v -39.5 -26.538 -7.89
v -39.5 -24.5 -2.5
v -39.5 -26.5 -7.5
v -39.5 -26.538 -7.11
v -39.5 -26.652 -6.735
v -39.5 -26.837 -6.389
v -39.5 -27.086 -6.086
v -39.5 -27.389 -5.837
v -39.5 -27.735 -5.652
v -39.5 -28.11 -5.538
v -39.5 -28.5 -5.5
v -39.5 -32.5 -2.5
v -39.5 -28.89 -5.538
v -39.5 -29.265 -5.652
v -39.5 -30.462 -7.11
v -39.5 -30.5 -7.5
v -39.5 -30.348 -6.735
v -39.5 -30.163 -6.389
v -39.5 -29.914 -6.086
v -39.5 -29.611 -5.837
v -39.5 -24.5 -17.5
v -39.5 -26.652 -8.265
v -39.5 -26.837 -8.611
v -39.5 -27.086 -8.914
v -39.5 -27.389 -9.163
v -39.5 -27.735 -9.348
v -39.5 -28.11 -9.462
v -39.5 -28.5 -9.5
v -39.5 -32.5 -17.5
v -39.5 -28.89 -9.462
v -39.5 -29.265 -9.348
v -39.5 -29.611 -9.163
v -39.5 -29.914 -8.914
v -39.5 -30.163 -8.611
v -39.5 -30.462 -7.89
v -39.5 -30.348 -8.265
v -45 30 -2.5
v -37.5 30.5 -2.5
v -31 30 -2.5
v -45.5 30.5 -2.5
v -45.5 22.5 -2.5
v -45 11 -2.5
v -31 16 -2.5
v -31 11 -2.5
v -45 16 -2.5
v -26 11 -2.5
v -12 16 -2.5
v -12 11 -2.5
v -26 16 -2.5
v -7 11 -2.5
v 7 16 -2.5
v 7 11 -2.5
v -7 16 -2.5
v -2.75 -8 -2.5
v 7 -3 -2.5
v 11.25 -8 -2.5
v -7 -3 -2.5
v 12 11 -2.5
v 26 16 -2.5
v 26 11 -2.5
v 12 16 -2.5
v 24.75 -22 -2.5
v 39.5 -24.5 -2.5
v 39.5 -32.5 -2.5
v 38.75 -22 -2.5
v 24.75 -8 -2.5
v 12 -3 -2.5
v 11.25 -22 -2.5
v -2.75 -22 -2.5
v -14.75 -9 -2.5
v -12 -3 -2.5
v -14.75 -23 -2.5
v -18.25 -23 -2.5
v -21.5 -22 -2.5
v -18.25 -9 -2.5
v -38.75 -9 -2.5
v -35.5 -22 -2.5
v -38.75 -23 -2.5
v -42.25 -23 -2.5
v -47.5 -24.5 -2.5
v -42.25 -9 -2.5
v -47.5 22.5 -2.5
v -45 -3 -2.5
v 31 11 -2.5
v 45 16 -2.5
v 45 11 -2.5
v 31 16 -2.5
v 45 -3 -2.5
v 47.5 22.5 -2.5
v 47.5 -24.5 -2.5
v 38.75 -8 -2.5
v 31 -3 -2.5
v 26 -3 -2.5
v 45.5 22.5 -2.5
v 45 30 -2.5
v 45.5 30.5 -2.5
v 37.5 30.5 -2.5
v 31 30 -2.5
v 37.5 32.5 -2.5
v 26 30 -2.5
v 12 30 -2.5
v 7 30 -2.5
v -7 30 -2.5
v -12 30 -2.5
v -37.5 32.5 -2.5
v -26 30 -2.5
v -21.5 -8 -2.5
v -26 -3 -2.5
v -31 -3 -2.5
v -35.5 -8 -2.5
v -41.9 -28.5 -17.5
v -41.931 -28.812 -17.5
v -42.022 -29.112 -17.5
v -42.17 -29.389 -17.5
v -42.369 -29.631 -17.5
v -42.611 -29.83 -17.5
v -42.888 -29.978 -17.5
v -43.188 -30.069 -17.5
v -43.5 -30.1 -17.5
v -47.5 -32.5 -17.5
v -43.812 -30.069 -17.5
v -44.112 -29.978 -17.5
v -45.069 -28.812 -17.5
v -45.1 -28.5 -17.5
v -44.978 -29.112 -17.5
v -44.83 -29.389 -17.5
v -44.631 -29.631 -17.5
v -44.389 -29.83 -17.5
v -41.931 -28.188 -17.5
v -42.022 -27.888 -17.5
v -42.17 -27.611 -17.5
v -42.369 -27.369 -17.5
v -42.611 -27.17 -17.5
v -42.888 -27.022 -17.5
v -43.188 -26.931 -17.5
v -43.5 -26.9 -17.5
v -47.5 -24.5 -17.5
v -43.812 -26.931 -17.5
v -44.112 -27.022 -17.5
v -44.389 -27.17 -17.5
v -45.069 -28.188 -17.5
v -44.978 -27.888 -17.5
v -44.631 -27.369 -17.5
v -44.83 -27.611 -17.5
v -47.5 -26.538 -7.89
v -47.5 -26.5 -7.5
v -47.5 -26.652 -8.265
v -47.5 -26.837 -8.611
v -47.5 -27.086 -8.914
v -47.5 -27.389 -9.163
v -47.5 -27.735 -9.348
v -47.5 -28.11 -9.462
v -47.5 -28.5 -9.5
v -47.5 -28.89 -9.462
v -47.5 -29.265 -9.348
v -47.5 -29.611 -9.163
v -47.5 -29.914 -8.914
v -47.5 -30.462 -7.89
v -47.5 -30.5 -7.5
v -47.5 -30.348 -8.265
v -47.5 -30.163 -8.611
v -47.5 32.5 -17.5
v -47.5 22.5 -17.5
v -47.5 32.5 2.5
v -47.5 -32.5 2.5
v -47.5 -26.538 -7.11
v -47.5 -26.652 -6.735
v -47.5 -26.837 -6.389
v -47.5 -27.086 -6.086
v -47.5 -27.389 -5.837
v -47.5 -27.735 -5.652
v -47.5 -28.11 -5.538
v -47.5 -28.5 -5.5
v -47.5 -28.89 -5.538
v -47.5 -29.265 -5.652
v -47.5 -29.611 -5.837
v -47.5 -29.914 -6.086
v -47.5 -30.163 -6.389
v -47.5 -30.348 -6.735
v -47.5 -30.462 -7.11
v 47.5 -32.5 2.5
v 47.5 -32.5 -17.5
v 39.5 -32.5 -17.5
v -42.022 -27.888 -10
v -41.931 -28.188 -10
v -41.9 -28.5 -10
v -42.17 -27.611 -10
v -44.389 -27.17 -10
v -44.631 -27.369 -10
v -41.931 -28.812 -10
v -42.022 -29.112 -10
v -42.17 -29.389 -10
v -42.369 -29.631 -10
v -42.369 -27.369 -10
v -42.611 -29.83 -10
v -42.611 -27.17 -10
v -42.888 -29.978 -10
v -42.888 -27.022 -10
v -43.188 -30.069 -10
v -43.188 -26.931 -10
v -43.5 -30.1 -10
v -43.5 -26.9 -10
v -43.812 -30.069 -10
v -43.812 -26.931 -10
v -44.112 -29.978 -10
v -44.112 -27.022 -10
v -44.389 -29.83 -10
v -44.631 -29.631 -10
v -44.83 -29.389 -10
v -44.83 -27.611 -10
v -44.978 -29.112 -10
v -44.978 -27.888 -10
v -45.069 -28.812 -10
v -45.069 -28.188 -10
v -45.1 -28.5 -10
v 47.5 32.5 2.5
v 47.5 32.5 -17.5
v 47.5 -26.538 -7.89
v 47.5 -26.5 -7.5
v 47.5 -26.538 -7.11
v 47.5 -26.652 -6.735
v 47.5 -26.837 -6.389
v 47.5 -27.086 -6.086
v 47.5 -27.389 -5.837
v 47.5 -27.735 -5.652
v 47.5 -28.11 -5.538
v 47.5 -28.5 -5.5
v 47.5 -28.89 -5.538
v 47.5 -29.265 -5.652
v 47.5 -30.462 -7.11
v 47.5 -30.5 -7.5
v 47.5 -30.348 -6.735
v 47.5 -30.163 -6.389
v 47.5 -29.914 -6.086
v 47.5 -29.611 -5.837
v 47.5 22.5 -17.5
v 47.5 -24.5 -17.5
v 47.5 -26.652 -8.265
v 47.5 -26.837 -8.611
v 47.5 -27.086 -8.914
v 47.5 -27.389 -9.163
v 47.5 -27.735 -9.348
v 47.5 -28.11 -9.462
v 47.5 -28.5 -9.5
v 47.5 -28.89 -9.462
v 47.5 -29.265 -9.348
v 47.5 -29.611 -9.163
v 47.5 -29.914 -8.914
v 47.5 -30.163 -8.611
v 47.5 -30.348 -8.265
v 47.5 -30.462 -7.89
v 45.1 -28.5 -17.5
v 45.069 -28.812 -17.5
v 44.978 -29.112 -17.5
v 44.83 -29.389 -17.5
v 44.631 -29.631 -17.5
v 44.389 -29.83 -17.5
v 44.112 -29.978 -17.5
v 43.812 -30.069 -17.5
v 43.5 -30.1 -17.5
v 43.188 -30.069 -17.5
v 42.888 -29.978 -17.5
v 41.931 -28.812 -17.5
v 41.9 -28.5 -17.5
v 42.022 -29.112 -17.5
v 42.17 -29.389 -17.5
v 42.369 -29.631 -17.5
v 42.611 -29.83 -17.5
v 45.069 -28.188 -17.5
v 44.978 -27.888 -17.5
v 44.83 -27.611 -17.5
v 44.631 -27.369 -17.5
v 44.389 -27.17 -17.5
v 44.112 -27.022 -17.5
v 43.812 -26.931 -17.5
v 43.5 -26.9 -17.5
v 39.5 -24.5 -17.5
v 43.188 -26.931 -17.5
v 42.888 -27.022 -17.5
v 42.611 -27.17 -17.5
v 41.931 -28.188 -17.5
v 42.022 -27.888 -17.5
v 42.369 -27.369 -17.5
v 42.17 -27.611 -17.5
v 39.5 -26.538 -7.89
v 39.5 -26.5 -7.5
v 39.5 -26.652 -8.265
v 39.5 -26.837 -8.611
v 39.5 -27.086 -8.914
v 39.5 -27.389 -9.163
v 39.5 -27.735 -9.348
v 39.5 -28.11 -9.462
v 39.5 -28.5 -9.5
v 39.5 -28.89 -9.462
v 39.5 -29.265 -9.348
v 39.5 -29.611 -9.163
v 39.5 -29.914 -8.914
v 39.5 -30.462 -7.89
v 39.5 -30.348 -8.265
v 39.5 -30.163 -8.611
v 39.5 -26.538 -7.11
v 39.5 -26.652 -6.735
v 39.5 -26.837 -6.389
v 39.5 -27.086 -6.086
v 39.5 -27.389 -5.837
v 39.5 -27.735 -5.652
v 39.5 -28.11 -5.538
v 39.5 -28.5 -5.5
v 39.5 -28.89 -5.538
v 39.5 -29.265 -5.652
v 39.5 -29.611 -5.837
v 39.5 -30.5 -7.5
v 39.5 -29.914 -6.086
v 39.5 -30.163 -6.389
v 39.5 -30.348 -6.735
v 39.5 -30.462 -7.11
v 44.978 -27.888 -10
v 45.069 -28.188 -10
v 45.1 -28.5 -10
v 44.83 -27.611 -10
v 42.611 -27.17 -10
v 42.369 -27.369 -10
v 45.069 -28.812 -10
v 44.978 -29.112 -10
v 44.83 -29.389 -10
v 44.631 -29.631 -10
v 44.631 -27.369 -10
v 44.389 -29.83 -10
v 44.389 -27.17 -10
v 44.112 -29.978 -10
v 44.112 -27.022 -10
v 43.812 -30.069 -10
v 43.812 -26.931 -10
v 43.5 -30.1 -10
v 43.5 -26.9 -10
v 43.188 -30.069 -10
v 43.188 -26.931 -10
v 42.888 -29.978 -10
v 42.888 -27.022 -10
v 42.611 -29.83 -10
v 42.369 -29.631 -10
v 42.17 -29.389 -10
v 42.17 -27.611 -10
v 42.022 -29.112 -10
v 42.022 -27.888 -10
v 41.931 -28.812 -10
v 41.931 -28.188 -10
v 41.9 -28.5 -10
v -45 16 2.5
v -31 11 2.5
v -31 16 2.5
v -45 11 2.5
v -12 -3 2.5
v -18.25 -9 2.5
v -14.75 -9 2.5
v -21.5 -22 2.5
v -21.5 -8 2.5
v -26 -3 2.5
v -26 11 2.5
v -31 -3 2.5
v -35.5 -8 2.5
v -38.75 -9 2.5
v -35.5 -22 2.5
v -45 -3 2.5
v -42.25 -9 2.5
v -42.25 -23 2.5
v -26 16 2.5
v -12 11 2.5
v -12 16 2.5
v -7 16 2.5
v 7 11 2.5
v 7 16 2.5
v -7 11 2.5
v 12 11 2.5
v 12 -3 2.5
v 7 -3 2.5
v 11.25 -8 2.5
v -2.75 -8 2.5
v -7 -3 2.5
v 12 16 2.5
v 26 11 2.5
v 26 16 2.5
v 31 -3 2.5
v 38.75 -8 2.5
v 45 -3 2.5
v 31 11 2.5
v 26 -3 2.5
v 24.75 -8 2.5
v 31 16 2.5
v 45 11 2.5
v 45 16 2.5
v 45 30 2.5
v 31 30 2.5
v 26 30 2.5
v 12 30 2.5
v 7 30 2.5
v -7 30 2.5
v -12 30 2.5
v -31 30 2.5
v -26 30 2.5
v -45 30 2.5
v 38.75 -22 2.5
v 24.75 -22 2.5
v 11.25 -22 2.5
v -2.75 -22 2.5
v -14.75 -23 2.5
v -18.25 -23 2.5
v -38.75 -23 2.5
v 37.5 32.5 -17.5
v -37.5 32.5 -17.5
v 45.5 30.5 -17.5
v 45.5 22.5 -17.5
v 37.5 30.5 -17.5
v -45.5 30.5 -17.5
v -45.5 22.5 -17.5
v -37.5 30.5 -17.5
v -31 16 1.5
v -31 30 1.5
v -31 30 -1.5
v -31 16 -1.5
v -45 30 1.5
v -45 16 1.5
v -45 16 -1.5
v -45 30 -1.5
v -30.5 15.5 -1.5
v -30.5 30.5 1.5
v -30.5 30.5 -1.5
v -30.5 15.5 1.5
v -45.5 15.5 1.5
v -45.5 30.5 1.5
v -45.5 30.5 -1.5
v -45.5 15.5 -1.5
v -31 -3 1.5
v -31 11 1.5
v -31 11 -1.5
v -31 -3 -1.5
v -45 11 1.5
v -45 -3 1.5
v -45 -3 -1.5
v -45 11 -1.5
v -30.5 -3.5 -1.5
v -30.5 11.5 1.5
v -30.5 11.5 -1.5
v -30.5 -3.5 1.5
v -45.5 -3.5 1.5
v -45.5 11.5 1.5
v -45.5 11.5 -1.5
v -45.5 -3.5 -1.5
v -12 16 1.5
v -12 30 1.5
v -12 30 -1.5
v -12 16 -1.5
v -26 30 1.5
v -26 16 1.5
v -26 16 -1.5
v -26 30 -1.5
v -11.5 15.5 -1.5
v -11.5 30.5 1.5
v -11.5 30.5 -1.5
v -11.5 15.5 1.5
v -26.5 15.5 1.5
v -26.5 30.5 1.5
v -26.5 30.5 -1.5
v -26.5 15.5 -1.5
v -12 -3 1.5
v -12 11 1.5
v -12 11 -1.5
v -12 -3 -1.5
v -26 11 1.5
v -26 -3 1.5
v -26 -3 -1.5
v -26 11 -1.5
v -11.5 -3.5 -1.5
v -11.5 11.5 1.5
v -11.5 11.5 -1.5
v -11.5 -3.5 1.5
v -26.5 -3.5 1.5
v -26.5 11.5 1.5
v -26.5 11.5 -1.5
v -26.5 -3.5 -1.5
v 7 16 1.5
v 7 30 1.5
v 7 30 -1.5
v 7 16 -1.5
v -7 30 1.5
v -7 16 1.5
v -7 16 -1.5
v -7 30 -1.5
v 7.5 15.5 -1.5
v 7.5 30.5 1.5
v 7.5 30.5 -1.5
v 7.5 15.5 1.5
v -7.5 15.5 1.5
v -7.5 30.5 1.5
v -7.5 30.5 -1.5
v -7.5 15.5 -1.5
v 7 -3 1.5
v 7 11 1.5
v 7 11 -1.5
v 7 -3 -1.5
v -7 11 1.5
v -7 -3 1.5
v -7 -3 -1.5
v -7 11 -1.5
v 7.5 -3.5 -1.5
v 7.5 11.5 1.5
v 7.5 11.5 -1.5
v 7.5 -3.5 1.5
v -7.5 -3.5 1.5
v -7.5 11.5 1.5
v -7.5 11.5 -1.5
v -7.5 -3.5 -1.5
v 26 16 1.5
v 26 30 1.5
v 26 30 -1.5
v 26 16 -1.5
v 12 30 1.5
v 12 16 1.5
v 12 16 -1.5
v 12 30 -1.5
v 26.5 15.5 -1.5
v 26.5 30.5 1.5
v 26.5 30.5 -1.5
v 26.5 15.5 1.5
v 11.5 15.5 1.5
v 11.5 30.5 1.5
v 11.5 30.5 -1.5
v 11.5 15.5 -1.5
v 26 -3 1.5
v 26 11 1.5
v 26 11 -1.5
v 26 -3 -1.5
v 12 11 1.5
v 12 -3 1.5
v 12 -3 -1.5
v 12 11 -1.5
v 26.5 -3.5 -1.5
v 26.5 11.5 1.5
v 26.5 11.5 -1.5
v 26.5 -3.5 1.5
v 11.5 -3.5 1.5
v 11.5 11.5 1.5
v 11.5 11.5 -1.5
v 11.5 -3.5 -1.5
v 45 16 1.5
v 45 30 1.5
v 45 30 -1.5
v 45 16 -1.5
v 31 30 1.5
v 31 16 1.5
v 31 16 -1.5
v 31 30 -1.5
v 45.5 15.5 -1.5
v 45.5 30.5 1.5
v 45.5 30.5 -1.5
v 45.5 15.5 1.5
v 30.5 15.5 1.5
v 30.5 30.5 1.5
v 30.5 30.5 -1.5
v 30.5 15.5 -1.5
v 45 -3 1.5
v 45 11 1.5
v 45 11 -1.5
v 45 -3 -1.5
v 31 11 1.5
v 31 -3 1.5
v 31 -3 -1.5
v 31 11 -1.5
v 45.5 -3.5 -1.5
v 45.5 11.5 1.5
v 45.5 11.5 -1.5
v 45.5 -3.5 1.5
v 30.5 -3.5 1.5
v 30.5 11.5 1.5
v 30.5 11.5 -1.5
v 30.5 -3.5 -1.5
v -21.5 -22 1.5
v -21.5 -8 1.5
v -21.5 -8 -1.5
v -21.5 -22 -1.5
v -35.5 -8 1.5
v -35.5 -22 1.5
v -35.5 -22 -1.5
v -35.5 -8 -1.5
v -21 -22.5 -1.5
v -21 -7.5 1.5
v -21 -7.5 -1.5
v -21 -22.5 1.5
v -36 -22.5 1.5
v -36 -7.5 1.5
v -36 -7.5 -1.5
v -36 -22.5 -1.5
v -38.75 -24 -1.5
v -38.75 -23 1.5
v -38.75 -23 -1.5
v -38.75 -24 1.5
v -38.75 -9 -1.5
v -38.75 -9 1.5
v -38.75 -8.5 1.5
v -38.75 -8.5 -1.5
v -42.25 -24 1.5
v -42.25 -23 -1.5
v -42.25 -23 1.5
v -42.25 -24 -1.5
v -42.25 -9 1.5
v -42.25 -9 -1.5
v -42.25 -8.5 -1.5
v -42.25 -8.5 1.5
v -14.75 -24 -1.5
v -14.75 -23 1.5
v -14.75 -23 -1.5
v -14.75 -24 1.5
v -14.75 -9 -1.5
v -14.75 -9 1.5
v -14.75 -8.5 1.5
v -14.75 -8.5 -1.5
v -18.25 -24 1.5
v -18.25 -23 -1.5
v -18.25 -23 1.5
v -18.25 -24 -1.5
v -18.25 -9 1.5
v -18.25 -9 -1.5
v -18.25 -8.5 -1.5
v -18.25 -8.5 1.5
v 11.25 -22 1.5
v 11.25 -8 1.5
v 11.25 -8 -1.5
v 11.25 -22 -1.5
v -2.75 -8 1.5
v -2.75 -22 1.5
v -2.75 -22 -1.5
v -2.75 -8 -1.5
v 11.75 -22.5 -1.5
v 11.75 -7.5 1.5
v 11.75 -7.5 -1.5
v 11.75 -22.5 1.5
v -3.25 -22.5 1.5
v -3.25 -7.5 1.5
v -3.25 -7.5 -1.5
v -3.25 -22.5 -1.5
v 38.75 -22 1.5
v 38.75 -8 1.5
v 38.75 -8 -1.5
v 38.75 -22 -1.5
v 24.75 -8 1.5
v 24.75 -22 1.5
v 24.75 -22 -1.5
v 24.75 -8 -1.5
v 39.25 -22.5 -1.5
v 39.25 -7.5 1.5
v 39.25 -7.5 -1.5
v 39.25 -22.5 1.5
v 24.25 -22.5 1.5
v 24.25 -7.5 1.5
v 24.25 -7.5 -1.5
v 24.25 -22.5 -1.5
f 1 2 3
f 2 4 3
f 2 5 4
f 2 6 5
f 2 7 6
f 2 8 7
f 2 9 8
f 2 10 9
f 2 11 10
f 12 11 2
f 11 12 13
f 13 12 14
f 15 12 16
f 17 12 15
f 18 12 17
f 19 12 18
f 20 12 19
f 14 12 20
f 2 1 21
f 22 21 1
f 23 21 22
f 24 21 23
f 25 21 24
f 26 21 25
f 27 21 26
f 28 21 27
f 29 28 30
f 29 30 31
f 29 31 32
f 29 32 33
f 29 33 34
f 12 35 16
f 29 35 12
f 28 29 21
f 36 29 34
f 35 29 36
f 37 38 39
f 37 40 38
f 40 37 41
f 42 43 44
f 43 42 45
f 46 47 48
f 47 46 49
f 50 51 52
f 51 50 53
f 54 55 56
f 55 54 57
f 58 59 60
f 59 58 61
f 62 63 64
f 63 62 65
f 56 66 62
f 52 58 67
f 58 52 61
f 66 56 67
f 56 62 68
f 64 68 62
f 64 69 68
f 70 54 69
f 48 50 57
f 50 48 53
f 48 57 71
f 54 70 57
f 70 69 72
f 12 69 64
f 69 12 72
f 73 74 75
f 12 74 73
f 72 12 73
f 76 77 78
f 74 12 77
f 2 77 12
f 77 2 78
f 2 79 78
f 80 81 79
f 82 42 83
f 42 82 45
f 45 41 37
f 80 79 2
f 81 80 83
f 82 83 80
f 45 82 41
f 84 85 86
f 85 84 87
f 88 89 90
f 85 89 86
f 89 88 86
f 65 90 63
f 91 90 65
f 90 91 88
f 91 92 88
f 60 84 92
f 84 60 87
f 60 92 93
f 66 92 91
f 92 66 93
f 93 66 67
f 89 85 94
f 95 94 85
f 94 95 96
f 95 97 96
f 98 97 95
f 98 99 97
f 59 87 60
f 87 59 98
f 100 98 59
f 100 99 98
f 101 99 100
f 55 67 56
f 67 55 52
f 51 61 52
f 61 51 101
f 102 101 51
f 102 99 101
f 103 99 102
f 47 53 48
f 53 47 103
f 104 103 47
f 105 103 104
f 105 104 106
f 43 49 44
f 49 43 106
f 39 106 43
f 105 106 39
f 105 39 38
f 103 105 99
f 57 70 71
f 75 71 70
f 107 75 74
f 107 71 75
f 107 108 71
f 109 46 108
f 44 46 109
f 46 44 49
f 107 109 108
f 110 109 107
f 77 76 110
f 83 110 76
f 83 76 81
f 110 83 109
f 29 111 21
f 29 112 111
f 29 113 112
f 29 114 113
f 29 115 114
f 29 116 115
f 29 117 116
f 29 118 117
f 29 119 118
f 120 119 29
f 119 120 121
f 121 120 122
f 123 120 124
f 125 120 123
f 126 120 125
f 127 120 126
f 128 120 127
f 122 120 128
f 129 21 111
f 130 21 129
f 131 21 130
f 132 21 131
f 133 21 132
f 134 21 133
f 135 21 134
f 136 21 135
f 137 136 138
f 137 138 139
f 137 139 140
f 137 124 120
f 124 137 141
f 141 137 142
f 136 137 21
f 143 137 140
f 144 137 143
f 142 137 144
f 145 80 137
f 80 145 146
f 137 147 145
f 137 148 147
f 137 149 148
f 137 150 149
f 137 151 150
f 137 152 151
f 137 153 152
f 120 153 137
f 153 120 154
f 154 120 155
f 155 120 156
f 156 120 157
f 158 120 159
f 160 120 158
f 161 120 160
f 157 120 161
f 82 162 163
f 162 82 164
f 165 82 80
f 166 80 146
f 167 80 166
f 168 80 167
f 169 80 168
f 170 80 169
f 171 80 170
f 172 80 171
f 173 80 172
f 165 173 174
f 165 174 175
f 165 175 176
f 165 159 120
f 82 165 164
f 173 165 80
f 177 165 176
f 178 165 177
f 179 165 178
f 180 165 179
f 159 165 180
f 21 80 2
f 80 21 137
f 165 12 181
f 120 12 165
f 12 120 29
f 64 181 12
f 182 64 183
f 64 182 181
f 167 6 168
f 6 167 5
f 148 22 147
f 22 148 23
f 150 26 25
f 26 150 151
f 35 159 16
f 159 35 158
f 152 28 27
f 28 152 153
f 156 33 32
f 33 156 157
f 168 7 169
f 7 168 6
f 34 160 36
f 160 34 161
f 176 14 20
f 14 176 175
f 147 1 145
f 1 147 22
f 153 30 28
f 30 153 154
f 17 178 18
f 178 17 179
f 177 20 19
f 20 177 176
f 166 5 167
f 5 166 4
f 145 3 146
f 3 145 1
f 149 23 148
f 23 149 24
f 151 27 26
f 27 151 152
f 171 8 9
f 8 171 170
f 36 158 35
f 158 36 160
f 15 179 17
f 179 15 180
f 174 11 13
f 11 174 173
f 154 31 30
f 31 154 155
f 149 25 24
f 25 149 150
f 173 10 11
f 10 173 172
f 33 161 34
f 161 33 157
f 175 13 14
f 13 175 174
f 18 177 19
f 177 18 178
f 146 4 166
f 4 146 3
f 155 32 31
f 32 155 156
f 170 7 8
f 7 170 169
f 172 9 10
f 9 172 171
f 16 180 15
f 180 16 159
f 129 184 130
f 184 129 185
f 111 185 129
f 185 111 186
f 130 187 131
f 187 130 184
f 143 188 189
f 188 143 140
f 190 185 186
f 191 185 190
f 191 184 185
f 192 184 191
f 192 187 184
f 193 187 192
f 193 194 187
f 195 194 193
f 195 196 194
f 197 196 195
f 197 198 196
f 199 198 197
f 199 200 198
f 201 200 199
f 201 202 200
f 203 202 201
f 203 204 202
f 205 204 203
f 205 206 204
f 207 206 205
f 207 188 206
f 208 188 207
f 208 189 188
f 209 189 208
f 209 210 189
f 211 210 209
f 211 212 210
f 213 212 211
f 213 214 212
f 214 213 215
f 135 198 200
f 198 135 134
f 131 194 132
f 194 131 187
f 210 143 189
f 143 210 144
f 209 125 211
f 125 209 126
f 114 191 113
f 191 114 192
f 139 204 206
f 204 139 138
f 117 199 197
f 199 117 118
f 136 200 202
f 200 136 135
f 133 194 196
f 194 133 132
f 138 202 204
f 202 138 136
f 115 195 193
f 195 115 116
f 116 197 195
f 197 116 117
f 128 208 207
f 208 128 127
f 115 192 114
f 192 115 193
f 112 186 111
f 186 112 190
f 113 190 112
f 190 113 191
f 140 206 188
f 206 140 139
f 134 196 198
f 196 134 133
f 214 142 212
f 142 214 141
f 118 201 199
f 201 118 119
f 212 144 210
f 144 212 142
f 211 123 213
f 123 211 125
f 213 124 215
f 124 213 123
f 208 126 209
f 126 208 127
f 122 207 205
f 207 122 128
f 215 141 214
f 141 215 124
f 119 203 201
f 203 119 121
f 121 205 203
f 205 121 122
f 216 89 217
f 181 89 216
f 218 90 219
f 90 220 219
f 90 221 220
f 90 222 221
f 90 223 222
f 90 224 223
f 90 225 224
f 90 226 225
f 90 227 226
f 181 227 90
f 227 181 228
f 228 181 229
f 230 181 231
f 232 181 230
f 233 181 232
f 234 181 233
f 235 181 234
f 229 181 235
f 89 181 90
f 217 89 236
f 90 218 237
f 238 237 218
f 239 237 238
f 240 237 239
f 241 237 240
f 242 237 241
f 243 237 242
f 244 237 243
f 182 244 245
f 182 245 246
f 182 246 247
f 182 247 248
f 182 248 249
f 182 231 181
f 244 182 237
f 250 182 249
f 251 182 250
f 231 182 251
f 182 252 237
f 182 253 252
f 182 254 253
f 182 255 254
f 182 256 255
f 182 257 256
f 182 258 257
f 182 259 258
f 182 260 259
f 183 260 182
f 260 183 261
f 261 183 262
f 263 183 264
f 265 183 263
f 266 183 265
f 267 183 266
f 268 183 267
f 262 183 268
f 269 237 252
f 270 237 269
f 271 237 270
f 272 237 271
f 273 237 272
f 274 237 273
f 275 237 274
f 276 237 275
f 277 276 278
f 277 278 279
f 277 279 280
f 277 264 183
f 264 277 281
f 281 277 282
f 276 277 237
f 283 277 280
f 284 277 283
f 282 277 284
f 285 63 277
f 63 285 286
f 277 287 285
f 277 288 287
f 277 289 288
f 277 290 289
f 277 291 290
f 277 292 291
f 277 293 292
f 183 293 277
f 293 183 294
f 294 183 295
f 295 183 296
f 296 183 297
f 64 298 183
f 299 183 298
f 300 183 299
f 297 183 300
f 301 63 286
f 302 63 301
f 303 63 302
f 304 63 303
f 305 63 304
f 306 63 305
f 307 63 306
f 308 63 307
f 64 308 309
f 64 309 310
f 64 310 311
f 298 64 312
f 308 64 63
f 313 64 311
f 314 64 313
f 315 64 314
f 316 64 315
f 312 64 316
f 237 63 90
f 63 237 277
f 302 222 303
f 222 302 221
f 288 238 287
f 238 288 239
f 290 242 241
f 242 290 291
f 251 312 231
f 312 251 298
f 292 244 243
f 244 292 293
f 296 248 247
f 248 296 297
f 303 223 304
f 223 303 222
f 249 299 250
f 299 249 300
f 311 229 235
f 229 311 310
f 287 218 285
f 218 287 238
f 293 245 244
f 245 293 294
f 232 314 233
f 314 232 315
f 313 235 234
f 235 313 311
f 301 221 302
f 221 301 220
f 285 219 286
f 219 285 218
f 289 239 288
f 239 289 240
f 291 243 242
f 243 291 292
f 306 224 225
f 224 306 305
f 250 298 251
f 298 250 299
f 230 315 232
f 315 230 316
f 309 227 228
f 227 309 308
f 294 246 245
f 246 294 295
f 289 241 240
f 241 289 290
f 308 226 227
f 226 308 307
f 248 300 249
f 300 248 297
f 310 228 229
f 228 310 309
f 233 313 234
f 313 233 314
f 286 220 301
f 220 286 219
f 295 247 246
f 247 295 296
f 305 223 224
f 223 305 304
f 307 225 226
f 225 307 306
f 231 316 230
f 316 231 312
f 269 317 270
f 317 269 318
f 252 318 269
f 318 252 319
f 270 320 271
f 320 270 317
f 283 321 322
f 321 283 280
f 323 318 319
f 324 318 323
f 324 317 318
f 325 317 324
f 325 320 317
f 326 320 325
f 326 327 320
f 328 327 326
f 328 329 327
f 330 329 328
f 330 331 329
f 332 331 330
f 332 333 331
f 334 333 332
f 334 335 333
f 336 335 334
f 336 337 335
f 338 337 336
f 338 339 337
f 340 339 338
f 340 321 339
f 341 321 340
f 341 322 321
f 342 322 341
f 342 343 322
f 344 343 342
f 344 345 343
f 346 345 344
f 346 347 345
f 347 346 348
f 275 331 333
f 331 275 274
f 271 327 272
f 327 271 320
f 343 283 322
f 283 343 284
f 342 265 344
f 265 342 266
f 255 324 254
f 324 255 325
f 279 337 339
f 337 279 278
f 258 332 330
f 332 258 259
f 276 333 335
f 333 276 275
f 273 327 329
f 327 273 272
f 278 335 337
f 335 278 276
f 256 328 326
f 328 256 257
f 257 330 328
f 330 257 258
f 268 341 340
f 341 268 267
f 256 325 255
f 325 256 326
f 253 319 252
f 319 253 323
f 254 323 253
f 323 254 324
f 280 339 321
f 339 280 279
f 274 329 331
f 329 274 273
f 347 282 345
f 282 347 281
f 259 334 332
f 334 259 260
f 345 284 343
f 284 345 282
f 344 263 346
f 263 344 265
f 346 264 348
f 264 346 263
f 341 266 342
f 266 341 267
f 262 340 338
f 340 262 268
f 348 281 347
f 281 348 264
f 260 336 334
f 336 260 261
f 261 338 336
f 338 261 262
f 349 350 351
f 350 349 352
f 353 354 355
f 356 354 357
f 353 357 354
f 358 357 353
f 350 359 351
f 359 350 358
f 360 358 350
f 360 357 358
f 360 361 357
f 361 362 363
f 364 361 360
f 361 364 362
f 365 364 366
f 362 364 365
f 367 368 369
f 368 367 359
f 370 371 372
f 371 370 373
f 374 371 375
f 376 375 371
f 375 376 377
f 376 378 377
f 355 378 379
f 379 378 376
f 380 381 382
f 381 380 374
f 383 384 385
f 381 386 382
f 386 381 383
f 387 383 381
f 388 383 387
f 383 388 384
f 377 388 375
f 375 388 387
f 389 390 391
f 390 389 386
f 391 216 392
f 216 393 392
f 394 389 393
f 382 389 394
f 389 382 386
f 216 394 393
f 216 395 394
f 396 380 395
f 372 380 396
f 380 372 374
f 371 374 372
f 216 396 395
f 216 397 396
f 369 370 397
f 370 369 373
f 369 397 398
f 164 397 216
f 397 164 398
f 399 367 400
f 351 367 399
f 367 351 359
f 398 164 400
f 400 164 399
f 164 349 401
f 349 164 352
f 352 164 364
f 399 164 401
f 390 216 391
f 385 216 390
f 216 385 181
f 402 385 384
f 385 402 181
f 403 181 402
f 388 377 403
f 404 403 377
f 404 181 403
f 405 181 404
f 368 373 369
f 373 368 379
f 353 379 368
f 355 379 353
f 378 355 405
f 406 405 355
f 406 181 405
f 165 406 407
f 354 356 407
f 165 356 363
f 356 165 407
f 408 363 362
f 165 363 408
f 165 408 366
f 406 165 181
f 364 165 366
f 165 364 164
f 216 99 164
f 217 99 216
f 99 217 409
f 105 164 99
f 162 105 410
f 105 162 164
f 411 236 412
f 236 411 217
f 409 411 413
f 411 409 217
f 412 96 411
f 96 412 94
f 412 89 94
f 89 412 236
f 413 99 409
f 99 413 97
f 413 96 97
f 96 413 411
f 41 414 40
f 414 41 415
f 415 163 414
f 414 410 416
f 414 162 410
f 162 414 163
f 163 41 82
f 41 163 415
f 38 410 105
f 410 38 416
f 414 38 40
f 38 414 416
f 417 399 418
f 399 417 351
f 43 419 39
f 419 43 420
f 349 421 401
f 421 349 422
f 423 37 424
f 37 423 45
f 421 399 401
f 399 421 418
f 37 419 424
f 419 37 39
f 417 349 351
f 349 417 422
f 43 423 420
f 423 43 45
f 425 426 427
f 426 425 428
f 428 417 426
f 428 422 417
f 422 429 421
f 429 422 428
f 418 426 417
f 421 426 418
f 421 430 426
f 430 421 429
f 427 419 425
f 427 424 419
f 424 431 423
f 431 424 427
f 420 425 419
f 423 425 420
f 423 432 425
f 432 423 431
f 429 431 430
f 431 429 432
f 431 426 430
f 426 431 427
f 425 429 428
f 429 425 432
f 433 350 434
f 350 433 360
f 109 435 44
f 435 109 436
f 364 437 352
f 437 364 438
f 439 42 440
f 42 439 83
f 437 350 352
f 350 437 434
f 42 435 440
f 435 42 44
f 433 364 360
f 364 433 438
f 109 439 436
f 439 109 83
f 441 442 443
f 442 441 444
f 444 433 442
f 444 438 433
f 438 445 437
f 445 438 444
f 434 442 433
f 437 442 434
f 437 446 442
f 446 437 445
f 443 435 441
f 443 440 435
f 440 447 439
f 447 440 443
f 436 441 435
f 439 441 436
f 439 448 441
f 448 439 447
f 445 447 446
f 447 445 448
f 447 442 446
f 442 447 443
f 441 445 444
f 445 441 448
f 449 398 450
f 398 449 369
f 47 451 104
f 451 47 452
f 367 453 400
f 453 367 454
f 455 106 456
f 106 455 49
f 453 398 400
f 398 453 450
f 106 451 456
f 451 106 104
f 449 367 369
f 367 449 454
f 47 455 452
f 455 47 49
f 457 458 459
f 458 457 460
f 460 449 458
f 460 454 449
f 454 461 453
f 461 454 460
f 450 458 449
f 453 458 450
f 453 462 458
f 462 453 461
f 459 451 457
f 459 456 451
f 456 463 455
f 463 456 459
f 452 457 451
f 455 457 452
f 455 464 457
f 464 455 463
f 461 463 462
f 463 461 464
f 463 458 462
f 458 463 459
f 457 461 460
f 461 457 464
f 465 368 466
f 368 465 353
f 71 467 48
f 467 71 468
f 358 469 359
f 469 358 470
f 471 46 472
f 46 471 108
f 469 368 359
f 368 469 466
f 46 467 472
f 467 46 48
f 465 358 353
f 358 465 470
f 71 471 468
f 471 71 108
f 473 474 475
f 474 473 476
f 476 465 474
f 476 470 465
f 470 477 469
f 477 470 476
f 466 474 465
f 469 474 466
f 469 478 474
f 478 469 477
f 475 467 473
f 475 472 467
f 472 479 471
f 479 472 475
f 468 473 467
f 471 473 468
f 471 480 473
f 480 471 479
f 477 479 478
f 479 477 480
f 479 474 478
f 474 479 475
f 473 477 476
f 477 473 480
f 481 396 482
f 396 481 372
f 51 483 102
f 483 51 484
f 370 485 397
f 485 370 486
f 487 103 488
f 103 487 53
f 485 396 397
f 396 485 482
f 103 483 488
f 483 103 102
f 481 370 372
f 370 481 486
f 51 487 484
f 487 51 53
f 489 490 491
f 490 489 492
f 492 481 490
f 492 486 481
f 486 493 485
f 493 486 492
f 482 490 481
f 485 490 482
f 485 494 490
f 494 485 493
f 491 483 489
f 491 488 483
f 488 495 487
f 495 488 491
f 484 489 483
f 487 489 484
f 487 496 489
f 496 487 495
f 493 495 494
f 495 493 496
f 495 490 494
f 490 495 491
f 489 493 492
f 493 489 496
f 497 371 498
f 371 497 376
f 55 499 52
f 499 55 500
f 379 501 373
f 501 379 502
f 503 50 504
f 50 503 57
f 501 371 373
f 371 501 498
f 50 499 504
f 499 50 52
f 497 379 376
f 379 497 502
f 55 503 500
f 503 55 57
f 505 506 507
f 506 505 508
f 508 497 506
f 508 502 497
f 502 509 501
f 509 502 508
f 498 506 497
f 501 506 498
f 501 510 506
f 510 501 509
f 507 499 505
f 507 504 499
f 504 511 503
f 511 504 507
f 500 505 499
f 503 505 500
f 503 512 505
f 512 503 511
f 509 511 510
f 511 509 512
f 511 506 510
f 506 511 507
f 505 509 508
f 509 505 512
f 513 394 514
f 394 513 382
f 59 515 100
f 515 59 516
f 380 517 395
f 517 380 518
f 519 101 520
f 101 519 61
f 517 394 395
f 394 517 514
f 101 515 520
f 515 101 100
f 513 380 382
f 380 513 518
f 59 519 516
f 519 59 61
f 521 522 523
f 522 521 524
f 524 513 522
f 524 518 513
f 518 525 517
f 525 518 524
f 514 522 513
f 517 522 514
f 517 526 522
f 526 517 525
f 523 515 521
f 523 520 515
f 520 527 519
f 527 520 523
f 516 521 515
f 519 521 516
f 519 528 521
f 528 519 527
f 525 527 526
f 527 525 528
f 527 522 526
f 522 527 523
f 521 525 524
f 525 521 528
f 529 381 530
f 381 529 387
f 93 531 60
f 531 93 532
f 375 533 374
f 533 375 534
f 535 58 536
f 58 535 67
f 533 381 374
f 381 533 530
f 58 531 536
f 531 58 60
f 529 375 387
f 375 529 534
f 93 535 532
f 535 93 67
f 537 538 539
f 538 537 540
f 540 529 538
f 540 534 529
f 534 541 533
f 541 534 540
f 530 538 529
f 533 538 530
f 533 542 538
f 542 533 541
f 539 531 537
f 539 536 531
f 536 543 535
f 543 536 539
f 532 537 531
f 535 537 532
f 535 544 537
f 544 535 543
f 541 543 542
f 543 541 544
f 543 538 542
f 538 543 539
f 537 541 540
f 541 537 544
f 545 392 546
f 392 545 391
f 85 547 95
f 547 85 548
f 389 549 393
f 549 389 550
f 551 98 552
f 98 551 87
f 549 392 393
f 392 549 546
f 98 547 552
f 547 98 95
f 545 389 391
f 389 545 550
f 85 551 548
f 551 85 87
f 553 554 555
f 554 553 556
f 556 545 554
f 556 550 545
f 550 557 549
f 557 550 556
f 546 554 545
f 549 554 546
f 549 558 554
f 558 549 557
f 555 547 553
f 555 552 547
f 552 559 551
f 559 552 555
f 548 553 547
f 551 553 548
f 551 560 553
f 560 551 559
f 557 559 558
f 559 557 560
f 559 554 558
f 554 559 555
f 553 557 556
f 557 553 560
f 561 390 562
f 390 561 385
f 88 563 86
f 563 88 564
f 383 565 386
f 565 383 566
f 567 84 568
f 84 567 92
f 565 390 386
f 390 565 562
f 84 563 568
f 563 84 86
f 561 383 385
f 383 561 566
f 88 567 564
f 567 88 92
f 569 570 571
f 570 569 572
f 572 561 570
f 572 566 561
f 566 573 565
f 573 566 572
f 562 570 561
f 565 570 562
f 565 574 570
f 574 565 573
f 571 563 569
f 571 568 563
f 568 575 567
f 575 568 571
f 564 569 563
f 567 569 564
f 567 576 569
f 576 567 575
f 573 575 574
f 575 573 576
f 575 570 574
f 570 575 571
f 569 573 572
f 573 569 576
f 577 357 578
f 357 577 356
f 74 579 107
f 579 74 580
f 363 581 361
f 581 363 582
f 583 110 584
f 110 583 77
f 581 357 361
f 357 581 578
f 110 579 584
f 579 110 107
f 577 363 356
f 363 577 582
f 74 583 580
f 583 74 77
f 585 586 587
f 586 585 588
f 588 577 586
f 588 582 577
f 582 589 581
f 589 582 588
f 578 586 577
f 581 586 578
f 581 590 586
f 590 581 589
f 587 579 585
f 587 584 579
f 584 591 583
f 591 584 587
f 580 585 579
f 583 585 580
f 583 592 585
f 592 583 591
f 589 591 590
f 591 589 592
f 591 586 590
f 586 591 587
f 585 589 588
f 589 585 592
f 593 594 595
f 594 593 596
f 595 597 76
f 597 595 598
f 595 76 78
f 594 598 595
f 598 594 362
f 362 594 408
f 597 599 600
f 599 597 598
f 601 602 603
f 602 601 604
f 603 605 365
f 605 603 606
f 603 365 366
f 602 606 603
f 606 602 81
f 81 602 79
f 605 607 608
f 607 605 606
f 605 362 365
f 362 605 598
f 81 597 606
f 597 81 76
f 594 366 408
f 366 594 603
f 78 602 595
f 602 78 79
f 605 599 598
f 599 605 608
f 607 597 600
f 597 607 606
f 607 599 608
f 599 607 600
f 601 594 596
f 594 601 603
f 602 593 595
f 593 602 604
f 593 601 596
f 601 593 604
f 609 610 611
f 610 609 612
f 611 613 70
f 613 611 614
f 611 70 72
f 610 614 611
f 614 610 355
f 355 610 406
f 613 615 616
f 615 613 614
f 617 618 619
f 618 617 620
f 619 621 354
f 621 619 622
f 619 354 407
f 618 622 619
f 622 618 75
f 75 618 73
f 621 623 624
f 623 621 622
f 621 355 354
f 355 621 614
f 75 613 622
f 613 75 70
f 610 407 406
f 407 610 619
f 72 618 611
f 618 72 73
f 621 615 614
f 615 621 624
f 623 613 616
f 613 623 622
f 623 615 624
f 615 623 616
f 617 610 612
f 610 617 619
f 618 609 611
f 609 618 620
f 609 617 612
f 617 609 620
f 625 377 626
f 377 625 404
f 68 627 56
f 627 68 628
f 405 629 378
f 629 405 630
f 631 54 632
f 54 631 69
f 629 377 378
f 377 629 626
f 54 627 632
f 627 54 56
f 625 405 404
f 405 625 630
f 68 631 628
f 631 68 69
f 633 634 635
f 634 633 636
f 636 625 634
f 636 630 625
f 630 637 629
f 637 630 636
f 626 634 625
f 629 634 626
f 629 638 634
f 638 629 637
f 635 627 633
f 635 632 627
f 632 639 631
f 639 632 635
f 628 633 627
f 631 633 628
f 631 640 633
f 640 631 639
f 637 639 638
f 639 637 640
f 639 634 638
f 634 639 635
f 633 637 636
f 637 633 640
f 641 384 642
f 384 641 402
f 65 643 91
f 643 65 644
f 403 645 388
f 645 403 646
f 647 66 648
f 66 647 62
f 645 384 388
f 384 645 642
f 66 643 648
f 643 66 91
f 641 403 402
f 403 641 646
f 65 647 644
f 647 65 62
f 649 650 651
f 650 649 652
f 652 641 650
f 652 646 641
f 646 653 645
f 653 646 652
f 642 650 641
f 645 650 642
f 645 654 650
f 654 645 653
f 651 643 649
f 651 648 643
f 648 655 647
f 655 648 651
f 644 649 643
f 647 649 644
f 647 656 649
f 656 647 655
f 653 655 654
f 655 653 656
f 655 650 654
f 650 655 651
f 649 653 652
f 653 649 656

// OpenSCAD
// file: common.scad
key_size = 14;
stabilizer_size = 3.5;

b_post = 8;
m_post_s = 2;
m_post_l = 10;
post_z = 15;

plat_z = 5;

module keyhole(x, y) {
  translate([x, y, 0]) {
    cube([key_size, key_size, plat_z + 1], center = true);
    cube([key_size + 1, key_size + 1, plat_z - 2], center = true);
  }
}

module double_wide(x, y) {
  keyhole(x, y);
  for (offset=[-12, 12]) {
     translate([x + offset, y - 1, 0]) {
       cube([stabilizer_size, key_size, plat_z + 1], center = true);
       translate([0, key_size/2, 0])
         cube([stabilizer_size, 1, plat_z - 2], center = true);
       translate([0, -key_size/2, 0])
         cube([stabilizer_size, 2, plat_z - 2], center = true);
     }
  }
}

module e_post(x, y, z) {
  translate([x, y, -(plat_z + post_z)/2]) {
    difference() {
      cube([b_post, b_post, post_z], center = true);
      translate([0, 0, -post_z/2]) cylinder(h=post_z, r=1.6, center=true, $fn=32);
    }
  }
}

module e_post_i(x, y, r) {
  translate([x, y, -(plat_z + post_z)/2]) {
    difference() {
      cube([b_post, b_post, post_z], center = true);
      translate([0, 0, post_z/6]) rotate(r) cylinder(h=b_post+1, r=2, center=true, $fn=32);
      translate([0, 0, -post_z/2]) cylinder(h=post_z, r=1.6, center=true, $fn=32);
    }
  }
}

module e_post_x(x, y) {
  e_post_i(x, y, [0, 90, 0]);
}


module e_post_y(x, y) {
  e_post_i(x, y, [90, 0, 0]);
}

module i_post_x(x, y) {
  translate([x, y, -(plat_z + post_z)/2]) cube([m_post_l, m_post_s, post_z], center = true);
}

module i_post_y(x, y) {
  translate([x, y, -(plat_z + post_z)/2]) cube([m_post_s, m_post_l, post_z], center = true);
}
// file: parameters.scad
key_size = 14;
key_sep = 5;
m_key_sep = 13.5;
l_key_sep = 33;

border = 8;
b_post = 8;
m_post_s = 2;
m_post_l = 10;
post_z = 15;

key_cell = key_size + key_sep;
m_key_cell_x = key_size + m_key_sep;
l_key_cell_x = 2*key_cell;

plat_z = 5;
// main file
// Ortho Mega section 7: bottom mid-right section

include <parameters.scad>

plat_x = 5*key_cell;
plat_y = border + 3*key_cell;

use <common.scad>

difference() {
  union() {
    cube([plat_x, plat_y, 5], center = true);
    e_post_x(-(plat_x-b_post)/2, -(plat_y-b_post)/2);
    
    e_post_x((plat_x-b_post)/2, -(plat_y-b_post)/2);

    i_post_y((plat_x - m_post_s)/2, (plat_y - m_post_l)/2);
    i_post_x((plat_x - m_post_l)/2, (plat_y - m_post_s)/2);
    
    i_post_y(-(plat_x - m_post_s)/2, (plat_y - m_post_l)/2);
    i_post_x(-(plat_x - m_post_l)/2, (plat_y - m_post_s)/2);
  }

  for (x = [0:4]) {
    for (y = [0:1]) {
      keyhole(-plat_x/2 + key_cell/2 + x*key_cell, plat_y/2 - key_cell/2 - y*key_cell);
    }
  }
  double_wide(-plat_x/2 + l_key_cell_x/2, plat_y/2 - key_cell/2 - 2*key_cell);
  keyhole(-plat_x/2 + l_key_cell_x + m_key_cell_x/2, plat_y/2 - key_cell/2 - 2*key_cell);
  keyhole(-plat_x/2 + l_key_cell_x + +m_key_cell_x + m_key_cell_x/2, plat_y/2 - key_cell/2 - 2*key_cell);
}
